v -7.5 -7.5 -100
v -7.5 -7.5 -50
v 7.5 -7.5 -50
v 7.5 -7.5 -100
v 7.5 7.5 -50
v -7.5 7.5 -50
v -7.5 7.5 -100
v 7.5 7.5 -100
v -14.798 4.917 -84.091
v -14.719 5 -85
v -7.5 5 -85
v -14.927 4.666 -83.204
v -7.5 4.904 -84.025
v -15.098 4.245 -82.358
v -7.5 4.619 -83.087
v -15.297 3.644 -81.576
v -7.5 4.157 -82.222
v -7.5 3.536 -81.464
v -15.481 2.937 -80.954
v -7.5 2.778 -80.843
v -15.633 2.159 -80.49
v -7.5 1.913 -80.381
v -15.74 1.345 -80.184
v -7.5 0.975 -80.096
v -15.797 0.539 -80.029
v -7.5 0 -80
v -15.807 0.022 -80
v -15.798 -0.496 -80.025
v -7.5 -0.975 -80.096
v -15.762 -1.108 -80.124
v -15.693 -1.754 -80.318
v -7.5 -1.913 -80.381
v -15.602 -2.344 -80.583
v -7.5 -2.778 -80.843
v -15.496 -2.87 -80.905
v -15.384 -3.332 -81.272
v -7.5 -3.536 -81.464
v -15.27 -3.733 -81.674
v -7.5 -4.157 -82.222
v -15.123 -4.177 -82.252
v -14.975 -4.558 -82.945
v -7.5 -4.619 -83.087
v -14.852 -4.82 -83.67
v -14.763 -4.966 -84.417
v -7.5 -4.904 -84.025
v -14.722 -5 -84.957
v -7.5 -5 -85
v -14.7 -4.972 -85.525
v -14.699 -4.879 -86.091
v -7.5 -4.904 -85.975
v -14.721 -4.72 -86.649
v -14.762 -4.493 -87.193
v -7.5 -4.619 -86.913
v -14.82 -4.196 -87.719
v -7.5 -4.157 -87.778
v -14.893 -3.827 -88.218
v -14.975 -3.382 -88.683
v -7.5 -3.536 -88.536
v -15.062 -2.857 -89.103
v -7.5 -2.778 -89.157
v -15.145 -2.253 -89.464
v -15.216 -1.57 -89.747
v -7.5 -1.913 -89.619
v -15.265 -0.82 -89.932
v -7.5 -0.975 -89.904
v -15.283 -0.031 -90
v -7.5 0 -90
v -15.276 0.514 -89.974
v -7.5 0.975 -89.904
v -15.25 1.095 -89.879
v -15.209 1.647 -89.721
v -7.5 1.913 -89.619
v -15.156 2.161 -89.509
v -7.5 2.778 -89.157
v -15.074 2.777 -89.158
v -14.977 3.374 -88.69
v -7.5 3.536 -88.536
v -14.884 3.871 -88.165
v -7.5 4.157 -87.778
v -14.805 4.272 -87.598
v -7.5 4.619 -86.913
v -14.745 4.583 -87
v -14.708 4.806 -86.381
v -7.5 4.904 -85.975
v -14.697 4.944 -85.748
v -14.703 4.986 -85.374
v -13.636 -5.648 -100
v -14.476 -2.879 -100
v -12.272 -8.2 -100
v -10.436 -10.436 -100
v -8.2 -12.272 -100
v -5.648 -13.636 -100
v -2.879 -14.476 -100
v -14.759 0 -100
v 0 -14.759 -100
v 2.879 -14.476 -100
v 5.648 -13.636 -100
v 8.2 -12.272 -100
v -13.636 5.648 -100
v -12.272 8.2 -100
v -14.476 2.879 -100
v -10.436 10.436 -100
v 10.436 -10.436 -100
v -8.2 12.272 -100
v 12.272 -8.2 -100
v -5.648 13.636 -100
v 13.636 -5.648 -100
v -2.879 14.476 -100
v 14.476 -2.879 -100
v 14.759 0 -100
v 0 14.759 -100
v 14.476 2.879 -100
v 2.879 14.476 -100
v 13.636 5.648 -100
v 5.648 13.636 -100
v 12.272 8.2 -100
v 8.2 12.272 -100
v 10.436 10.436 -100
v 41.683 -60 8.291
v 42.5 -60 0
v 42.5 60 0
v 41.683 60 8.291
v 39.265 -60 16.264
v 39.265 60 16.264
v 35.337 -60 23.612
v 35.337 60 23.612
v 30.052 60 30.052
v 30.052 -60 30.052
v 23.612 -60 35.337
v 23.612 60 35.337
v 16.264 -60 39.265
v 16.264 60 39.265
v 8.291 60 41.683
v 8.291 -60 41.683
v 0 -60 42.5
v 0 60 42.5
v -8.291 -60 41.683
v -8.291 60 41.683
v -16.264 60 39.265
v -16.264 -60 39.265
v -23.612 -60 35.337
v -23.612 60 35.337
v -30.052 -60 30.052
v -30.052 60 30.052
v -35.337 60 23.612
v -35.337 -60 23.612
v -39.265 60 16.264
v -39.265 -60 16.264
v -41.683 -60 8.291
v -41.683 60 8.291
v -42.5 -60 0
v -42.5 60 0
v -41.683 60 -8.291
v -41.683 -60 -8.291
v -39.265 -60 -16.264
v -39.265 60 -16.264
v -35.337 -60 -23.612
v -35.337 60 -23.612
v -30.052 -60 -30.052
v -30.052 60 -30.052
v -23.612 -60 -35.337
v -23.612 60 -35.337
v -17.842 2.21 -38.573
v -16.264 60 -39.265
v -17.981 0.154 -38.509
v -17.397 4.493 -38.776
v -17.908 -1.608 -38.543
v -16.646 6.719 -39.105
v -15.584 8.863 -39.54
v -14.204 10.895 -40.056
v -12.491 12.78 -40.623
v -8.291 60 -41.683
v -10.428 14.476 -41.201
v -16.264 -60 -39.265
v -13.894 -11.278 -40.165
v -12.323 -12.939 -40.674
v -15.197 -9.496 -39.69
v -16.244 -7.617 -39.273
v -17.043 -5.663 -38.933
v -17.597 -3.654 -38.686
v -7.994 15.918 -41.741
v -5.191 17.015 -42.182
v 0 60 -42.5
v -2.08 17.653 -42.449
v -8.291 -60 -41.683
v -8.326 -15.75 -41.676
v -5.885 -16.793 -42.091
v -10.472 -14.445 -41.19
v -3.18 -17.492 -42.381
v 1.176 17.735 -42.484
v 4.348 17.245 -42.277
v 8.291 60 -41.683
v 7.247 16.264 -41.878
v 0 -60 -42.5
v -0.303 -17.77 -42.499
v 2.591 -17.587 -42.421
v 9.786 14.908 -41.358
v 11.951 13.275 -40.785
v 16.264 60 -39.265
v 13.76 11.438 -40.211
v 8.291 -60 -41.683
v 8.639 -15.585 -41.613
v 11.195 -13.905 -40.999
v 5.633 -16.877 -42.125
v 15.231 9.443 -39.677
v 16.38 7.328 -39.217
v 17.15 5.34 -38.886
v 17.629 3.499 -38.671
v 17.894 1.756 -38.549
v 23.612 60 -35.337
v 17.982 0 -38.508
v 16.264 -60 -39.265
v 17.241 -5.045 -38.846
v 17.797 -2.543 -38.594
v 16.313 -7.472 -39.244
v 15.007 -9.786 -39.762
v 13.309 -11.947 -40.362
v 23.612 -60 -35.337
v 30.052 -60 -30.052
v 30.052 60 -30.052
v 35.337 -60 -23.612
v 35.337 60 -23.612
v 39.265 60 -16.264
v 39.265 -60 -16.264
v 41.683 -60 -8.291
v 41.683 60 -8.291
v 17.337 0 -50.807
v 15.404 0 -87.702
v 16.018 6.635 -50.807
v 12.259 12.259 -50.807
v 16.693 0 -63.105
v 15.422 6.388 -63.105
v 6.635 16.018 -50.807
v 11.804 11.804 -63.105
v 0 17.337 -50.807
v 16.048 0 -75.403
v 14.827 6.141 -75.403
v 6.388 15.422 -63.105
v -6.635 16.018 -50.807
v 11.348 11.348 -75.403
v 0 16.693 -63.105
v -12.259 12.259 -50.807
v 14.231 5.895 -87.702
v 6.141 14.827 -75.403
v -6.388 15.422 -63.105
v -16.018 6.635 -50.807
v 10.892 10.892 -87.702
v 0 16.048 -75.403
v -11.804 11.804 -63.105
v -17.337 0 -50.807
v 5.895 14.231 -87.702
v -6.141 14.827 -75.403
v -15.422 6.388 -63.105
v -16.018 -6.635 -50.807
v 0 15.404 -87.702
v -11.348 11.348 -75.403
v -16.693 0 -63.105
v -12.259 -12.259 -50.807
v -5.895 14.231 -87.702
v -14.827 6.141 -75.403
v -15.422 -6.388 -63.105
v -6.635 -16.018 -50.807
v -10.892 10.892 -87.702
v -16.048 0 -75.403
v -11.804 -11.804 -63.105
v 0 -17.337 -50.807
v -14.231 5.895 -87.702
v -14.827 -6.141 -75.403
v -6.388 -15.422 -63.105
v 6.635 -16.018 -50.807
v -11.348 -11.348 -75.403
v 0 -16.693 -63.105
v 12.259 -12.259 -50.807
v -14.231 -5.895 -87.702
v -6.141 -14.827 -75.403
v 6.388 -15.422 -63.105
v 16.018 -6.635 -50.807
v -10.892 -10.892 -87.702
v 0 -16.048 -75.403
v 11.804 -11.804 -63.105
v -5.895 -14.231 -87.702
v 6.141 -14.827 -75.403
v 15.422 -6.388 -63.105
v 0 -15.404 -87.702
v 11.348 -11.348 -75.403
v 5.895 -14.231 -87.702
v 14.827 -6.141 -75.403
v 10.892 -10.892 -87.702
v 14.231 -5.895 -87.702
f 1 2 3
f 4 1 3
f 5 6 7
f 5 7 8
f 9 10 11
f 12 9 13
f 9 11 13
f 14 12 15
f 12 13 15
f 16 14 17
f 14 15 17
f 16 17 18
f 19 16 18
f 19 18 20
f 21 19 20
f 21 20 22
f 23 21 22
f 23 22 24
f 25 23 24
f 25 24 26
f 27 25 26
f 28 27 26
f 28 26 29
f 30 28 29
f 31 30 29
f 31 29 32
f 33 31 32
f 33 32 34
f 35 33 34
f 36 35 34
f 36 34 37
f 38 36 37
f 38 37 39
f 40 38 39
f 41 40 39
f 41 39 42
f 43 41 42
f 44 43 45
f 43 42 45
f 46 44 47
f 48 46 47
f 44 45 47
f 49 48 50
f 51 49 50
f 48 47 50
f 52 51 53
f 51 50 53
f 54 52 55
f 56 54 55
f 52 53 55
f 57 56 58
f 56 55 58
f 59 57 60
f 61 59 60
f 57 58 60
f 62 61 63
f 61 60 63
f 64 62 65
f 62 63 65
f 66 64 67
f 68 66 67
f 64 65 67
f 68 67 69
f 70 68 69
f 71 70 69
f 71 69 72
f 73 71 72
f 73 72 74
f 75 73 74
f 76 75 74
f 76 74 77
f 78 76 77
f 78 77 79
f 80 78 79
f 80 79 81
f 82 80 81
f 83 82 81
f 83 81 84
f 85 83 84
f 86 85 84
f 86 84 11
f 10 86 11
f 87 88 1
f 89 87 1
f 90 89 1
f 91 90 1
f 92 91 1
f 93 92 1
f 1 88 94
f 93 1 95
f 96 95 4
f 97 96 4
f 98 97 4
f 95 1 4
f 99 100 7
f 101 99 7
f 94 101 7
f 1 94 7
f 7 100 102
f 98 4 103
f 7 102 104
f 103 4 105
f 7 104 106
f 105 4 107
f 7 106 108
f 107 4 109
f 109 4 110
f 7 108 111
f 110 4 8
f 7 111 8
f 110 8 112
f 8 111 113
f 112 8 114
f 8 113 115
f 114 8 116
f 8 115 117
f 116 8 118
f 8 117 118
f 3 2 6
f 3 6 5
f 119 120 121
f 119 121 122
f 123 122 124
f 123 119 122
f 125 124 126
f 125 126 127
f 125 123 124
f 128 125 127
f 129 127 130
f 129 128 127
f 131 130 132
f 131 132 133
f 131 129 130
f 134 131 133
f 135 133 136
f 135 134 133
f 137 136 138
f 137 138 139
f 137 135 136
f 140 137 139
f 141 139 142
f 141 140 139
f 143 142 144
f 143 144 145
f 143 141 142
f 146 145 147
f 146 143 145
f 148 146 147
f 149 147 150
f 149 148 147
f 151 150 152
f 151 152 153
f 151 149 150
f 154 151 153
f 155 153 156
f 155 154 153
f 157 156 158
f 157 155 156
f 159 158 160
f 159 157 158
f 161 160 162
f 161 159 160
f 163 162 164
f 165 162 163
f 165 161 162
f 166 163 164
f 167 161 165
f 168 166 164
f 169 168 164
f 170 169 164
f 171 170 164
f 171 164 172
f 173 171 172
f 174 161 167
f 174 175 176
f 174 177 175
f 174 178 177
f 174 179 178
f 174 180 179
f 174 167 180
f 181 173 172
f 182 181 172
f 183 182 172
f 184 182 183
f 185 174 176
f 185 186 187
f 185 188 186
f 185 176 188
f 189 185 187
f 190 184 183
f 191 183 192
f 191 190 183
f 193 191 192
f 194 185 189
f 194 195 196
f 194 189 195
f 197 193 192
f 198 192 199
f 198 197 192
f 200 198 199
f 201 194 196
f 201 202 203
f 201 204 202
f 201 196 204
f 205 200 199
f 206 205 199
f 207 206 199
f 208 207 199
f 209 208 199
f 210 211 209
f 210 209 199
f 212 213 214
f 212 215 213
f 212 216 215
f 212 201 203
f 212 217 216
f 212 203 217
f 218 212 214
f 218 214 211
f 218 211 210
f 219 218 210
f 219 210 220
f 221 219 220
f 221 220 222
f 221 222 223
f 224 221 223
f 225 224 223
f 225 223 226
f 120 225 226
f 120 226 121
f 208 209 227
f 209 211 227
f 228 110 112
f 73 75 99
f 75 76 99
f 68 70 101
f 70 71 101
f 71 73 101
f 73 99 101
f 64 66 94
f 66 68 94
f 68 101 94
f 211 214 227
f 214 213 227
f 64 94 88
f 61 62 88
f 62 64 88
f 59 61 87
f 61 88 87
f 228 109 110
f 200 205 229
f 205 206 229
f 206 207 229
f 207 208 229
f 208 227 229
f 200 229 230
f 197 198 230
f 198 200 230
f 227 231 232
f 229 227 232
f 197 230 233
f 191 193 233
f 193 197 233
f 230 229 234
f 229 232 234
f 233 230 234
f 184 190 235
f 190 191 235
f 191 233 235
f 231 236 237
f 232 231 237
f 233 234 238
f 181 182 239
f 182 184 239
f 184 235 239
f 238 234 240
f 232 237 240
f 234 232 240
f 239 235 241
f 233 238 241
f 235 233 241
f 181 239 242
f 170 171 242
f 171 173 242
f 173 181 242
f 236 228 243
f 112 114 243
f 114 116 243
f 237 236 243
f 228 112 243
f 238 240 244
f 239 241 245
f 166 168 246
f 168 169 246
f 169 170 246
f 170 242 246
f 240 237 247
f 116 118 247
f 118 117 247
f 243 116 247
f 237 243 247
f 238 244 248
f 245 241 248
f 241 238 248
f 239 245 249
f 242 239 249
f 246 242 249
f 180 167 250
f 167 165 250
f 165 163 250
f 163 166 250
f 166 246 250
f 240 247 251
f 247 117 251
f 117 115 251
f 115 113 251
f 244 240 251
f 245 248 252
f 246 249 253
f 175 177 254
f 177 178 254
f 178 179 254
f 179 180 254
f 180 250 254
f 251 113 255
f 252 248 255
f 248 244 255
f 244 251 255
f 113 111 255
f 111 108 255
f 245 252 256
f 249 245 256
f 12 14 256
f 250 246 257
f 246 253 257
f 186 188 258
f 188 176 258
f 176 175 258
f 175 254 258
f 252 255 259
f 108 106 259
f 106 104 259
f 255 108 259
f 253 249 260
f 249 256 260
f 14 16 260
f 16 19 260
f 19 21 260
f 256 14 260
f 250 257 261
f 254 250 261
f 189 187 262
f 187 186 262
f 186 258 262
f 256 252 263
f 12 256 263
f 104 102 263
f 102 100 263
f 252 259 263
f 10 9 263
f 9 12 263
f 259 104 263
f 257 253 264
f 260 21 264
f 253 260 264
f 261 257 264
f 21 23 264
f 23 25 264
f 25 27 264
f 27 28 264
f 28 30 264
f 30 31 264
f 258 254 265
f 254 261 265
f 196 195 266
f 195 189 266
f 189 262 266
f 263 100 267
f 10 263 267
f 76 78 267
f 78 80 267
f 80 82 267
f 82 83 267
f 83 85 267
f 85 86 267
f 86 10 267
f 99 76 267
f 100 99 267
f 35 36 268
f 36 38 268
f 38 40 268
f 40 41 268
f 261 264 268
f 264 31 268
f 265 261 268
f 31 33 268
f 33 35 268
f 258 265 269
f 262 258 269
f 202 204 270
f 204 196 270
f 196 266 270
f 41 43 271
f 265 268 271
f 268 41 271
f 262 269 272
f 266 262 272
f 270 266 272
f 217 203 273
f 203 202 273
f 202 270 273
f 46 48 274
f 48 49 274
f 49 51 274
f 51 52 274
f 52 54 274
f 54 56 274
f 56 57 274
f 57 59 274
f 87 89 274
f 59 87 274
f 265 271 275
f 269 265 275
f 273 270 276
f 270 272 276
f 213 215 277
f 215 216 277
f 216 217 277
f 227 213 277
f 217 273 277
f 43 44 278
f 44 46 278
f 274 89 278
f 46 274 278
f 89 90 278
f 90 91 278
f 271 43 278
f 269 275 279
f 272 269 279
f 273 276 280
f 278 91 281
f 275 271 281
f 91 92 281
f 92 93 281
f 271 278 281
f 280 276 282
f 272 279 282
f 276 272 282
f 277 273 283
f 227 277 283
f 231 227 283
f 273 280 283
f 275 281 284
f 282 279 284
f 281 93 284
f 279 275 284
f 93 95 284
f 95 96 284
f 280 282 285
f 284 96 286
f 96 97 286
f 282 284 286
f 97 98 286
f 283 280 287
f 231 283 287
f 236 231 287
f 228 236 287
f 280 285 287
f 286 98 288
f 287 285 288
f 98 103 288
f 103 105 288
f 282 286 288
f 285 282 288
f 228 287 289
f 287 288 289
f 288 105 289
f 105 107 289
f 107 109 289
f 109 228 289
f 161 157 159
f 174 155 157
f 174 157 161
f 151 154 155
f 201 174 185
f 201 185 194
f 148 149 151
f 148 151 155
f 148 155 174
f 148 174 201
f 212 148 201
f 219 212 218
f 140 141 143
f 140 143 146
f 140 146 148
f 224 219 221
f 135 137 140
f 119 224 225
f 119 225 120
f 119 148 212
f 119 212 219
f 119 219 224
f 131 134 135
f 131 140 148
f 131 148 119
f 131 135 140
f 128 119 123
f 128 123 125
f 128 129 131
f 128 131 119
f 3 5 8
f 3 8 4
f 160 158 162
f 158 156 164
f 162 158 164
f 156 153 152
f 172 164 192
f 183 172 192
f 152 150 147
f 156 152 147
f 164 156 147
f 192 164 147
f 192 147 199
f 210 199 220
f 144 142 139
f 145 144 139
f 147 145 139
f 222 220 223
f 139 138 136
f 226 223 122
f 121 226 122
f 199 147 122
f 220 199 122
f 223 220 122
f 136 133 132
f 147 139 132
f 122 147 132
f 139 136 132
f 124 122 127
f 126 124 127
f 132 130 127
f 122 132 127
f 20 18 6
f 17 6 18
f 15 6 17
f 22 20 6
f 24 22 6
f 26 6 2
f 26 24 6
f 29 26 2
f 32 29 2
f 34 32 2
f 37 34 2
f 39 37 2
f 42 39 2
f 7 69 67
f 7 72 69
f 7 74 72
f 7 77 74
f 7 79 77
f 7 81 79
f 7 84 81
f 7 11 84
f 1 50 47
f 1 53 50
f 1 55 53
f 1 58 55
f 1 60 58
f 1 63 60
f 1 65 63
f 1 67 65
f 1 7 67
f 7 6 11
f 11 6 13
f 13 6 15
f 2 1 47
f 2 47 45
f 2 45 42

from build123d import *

# Parameters (mm, degrees)
F0_R     = 42.5
F1_DEPTH = 60
F2_R     = 20
F3_DEPTH = 100
F3_TAPER = 3
F4_W     = 15
F4_H     = 15
F5_DEPTH = 50
F6_R     = 5
F7_DEPTH = 50


with BuildPart() as f1:
    # F0 (on Front) → F1 (new body, symmetric)
    with BuildSketch(Plane.XZ):
        Circle(F0_R)
    extrude(amount=F1_DEPTH, both=True)

    # F2 (on Top) → F3 (join)
    with BuildSketch(Plane.XY):
        Circle(F2_R)
    extrude(amount=-F3_DEPTH, taper=F3_TAPER)

    # F4 (on face) → F5 (cut)
    with BuildSketch(Plane(origin=(0, 0, -100), x_dir=(1, 0, 0), z_dir=(0, 0, -1))):
        Rectangle(F4_W, F4_H)
    extrude(amount=-F5_DEPTH, mode=Mode.SUBTRACT)

    # F6 (on Right) → F7 (cut)
    with BuildSketch(Plane.YZ):
        with Locations((0, -85)):
            Circle(F6_R)
    extrude(amount=-F7_DEPTH, mode=Mode.SUBTRACT)


solid = f1.part
